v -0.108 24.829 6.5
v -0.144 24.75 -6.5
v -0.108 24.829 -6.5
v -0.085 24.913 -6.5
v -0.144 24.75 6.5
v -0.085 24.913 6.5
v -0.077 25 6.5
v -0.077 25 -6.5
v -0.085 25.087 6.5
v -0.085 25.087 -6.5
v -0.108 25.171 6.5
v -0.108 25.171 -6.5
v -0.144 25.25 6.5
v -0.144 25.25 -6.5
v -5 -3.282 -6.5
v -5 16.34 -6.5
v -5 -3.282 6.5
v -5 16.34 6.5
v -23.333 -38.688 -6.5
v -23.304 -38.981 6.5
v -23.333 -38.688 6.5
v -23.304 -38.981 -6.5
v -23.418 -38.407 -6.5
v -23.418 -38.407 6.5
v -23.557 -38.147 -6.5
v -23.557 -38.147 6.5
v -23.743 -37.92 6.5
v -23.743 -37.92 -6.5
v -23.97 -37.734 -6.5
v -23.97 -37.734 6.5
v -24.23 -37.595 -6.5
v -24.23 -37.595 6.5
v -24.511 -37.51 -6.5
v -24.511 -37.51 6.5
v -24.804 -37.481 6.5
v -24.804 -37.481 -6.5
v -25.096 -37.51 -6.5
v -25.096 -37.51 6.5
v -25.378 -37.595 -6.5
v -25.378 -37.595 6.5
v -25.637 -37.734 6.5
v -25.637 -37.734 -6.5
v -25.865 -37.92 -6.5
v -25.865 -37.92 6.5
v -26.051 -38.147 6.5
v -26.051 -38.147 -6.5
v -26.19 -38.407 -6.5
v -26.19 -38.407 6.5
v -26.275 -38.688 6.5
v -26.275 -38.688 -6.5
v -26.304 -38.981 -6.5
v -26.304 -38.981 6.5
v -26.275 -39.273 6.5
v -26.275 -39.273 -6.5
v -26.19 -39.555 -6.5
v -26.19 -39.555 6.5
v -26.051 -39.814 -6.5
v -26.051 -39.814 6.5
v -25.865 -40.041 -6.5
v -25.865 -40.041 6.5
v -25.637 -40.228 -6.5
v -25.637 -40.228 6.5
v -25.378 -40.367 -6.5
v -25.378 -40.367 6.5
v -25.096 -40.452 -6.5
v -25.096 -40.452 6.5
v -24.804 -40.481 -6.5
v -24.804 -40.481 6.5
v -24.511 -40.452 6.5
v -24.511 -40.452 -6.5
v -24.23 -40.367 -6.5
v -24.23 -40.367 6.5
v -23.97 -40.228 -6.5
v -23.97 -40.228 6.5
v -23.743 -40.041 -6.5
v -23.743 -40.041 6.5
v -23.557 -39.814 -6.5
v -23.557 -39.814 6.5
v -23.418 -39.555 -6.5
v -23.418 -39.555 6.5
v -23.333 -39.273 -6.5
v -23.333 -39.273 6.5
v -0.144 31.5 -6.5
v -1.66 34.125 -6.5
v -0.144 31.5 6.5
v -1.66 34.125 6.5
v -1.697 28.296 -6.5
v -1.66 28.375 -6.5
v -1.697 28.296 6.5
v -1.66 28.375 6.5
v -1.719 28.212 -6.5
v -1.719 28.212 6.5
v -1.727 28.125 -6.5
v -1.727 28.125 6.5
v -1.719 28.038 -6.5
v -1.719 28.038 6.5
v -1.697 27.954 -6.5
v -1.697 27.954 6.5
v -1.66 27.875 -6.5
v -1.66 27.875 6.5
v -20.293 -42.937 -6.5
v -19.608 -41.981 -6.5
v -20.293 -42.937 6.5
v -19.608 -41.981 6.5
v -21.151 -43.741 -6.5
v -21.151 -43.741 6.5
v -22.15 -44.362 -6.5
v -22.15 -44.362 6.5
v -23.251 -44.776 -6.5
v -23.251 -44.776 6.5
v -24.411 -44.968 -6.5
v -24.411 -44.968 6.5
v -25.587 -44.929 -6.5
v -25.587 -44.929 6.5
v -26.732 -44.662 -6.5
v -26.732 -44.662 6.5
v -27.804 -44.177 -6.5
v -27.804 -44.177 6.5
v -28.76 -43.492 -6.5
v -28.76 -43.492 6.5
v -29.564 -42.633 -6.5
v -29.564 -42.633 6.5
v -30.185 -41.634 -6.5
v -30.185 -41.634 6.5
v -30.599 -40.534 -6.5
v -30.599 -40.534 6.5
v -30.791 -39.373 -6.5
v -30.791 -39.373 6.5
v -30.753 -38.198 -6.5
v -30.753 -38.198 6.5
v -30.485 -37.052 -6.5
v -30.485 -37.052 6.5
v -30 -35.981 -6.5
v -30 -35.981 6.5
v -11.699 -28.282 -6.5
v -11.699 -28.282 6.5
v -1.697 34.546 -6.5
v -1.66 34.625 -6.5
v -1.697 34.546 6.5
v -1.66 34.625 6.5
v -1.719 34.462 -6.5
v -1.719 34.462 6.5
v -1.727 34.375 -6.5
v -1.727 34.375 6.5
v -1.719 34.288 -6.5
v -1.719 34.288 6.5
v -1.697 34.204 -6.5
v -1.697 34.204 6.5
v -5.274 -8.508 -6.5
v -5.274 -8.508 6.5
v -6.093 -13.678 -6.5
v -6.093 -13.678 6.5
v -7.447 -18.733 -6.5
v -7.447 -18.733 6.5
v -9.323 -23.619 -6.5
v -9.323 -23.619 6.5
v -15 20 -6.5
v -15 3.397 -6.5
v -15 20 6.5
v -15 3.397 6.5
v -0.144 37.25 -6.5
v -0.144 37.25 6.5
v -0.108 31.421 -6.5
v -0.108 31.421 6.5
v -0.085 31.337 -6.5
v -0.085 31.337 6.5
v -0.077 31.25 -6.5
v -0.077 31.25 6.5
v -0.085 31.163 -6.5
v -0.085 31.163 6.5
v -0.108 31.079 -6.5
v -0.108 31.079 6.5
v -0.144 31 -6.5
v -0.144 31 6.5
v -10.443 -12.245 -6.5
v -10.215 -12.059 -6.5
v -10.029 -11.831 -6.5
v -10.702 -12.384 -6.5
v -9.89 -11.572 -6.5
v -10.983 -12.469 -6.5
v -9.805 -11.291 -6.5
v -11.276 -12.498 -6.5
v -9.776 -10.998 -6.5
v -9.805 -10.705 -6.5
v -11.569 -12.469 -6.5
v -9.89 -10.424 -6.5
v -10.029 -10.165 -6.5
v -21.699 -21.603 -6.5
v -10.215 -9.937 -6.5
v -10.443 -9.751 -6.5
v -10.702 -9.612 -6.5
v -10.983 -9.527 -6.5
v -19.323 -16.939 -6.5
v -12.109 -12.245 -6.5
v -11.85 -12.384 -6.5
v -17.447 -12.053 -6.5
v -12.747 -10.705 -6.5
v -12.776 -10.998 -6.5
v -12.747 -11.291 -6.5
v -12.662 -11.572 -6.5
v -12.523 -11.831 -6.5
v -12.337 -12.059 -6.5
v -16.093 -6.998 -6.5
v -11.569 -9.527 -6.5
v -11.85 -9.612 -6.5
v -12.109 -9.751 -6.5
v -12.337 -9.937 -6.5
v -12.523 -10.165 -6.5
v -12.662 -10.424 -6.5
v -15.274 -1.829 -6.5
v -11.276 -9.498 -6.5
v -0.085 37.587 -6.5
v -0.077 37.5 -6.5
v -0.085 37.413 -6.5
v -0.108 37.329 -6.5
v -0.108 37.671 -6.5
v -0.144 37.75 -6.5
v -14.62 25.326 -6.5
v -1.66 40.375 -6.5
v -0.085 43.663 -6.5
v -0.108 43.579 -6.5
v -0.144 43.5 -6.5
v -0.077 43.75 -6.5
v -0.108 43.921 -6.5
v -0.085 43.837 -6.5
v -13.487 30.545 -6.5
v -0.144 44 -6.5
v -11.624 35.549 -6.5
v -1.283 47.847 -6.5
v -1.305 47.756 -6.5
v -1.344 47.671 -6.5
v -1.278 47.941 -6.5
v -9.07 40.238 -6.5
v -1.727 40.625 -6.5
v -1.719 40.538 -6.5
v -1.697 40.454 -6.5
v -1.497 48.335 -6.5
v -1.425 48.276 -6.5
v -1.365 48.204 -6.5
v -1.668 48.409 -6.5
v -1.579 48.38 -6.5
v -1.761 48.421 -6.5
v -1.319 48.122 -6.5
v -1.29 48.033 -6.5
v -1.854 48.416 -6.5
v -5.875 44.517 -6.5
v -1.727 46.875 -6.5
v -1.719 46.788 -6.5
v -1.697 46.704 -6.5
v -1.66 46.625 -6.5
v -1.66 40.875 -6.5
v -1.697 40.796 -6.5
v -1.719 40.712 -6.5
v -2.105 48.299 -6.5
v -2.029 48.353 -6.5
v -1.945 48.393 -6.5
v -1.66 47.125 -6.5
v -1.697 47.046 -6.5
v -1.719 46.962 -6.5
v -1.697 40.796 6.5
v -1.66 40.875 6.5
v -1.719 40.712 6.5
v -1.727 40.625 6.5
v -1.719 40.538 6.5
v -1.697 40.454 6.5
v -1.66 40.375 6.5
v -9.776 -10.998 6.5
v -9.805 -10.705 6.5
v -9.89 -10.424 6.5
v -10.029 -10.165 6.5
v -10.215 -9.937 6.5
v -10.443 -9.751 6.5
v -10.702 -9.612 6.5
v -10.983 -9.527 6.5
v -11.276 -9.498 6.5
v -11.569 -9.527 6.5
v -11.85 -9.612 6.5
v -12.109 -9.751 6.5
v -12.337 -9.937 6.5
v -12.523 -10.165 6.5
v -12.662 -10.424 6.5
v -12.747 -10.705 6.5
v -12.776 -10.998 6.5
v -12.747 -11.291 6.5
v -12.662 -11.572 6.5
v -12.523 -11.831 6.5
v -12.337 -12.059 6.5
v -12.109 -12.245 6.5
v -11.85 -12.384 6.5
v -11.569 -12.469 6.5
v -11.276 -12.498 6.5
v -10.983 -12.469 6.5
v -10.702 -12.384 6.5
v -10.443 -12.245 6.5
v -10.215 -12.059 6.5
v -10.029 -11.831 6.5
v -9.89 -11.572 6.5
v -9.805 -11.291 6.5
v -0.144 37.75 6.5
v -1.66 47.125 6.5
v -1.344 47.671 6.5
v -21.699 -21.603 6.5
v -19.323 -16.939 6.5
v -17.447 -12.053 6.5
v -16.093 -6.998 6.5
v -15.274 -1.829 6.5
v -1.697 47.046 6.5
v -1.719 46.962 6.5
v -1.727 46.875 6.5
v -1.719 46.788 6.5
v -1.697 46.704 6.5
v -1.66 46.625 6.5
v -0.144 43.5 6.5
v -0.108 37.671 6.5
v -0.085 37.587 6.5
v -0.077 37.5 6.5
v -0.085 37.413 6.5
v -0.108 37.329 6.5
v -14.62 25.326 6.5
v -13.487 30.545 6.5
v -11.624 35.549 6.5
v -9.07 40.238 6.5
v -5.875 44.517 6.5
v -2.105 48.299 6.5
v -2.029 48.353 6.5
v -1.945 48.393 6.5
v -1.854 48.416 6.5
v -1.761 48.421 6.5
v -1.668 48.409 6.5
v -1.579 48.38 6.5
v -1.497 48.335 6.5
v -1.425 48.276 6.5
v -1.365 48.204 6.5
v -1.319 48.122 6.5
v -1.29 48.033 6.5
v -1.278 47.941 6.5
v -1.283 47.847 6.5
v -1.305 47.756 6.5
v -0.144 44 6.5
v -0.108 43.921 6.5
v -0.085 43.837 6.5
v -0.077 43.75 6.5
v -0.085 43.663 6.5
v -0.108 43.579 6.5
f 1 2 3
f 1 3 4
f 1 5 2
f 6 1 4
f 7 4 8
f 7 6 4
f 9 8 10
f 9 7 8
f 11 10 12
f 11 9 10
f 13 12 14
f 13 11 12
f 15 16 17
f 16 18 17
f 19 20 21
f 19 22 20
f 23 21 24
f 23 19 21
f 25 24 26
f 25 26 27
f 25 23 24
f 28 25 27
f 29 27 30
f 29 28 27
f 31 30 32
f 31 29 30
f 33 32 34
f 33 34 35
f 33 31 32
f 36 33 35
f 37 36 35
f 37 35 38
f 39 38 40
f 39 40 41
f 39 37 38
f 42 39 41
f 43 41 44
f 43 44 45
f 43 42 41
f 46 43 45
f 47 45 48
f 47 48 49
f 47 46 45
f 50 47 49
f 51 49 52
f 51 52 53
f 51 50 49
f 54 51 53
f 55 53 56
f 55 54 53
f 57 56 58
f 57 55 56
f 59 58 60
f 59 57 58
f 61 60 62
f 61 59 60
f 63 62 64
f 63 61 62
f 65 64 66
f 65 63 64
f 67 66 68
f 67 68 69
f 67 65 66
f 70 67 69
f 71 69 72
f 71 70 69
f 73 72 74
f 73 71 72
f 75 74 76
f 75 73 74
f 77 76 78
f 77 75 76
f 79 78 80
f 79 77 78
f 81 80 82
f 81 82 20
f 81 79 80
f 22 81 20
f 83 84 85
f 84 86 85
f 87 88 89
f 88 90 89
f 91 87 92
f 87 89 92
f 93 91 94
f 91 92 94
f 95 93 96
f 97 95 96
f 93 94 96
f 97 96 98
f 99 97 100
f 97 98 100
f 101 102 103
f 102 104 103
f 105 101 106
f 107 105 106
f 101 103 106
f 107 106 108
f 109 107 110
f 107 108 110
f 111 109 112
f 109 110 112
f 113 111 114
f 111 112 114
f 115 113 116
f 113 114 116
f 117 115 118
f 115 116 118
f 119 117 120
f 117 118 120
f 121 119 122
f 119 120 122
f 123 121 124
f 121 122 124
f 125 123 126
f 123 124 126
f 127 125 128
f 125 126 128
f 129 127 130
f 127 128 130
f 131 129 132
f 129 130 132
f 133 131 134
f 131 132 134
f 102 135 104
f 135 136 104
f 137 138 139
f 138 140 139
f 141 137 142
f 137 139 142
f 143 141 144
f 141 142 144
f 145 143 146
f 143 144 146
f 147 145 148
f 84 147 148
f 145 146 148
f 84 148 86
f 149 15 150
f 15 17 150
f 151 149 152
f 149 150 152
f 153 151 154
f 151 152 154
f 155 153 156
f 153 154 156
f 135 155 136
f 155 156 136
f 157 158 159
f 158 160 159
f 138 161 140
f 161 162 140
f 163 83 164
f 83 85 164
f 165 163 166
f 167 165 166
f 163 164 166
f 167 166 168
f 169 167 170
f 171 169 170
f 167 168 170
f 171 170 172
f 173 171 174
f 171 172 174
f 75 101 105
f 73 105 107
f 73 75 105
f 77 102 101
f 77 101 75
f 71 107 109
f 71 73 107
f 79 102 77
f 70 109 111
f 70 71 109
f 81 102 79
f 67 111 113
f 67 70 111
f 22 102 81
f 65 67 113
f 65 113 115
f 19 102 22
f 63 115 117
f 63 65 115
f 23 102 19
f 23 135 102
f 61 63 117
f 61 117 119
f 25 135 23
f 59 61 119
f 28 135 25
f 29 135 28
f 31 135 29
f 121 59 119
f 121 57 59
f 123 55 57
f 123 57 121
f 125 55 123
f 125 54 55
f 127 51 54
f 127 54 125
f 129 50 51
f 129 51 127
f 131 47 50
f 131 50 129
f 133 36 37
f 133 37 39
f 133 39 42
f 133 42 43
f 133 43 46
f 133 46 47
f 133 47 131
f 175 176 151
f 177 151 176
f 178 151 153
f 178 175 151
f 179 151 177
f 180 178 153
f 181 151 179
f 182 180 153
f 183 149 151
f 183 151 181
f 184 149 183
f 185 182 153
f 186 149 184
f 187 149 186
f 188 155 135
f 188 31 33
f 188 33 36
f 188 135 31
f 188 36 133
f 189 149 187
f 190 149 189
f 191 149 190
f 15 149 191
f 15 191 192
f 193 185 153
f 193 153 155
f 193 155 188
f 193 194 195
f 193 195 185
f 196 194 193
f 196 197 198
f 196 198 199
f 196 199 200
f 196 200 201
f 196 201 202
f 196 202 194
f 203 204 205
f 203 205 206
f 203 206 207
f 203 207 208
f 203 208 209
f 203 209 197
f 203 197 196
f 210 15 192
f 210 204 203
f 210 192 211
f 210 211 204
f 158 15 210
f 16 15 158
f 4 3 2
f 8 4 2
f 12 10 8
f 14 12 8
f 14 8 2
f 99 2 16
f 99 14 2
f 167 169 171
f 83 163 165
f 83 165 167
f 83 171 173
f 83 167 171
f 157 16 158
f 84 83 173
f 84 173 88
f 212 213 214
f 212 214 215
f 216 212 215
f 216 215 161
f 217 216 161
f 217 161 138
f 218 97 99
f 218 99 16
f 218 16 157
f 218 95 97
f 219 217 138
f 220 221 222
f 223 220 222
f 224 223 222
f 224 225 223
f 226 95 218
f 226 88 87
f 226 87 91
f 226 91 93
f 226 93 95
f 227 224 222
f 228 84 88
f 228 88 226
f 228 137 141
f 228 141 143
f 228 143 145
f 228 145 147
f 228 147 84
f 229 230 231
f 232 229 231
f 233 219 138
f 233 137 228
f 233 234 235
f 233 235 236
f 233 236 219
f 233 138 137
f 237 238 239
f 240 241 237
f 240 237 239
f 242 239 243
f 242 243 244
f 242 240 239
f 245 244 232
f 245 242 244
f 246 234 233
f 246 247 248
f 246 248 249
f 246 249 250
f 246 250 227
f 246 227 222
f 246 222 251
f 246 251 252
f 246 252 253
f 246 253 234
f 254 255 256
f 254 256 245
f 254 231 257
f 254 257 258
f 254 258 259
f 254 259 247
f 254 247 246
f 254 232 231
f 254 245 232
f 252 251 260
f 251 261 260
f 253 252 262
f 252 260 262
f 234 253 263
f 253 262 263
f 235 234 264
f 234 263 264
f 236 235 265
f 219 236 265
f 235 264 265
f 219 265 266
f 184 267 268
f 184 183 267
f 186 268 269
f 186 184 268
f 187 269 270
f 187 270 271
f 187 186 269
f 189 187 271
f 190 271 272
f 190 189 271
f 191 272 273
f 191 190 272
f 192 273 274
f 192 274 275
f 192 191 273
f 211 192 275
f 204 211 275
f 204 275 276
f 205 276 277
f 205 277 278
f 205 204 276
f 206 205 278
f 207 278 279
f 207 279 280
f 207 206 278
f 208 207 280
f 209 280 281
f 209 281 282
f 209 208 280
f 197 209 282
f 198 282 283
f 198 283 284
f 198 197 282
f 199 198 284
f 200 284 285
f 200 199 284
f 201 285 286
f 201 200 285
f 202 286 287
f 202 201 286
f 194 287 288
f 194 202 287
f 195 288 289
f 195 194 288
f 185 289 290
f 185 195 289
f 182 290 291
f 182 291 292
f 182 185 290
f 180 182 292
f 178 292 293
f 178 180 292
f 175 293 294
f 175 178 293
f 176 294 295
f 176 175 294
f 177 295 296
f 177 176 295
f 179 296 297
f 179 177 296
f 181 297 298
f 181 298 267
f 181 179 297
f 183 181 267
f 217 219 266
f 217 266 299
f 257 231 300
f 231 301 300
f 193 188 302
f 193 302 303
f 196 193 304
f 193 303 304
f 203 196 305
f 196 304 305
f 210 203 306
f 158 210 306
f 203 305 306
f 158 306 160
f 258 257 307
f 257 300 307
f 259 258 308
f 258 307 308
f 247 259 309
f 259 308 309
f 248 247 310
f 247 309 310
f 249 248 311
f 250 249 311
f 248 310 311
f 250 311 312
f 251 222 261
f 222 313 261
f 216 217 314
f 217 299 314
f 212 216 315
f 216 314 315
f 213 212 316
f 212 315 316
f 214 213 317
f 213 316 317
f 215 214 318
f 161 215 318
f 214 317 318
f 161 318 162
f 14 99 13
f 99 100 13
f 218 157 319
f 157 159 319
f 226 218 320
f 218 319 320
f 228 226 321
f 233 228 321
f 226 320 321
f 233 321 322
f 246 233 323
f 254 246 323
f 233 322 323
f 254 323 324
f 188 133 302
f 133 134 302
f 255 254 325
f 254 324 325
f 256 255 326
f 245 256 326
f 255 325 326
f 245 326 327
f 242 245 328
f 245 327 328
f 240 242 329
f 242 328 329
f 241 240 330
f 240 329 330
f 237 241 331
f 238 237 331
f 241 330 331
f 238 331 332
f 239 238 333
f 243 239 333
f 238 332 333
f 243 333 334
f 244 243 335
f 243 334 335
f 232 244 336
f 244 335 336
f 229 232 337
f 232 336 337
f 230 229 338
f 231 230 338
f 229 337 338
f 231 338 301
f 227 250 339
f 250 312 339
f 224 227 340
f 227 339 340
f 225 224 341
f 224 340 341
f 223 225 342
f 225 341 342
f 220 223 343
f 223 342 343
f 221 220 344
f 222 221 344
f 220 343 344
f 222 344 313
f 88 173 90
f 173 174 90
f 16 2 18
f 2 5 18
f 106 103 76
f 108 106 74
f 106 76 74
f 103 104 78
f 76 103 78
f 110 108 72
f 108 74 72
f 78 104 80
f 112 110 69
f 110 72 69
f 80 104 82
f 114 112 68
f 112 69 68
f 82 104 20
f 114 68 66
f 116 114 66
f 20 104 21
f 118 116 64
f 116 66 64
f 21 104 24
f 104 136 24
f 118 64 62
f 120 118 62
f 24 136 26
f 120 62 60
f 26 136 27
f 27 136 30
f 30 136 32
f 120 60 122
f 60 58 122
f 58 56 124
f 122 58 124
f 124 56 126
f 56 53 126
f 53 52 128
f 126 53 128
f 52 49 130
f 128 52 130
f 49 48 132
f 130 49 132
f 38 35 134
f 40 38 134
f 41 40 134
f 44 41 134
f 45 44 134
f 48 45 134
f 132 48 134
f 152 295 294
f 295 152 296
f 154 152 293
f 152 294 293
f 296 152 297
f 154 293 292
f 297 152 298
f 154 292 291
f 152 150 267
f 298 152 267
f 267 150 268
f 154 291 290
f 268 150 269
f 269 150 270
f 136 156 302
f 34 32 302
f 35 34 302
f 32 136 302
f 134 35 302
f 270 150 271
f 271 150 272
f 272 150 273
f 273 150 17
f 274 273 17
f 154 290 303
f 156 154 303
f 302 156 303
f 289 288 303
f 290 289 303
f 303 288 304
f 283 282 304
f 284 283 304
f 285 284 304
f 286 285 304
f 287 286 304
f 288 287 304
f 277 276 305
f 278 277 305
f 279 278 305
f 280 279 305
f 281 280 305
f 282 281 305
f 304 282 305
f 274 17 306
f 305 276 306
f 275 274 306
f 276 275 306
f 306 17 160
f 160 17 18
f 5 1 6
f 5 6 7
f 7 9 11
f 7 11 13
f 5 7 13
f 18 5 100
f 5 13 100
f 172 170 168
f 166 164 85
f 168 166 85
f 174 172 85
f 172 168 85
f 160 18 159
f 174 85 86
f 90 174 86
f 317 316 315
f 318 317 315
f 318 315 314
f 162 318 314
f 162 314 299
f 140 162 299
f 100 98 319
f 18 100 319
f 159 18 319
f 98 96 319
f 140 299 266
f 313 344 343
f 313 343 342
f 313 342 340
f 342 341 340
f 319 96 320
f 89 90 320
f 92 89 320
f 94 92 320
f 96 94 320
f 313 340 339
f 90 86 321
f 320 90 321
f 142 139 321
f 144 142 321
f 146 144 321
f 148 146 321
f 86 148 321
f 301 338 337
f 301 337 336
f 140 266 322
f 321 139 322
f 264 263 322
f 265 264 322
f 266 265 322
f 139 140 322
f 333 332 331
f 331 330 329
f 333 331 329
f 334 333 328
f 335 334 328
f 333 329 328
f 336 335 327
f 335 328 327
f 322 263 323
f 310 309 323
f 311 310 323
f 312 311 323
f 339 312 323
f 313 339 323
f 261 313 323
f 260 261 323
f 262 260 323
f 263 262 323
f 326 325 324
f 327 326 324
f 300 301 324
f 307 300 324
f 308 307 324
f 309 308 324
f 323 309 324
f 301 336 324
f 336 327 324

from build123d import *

# Parameters (mm, degrees)
SKETCH1_R           = 1.5
BOSS_EXTRUDE1_DEPTH = 6.5
FILLET1_R           = 0.5


with BuildPart() as part:
    # Sketch1 → Boss-Extrude1 (new body, symmetric)
    with BuildSketch(Plane.XY):
        with BuildLine():
            Line((0, 25), (-5, 16.339745962))
            Line((-5, 16.339745962), (-5, -3.282032303))
            ThreePointArc((-5, -3.282032303), (-6.703708686, -16.222984558), (-11.698729811, -28.282032303))
            Line((-11.698729811, -28.282032303), (-19.607695155, -41.980762114))
            ThreePointArc((-19.607695155, -41.980762114), (-27.803847577, -44.176914536), (-30, -35.980762114))
            Line((-30, -35.980762114), (-21.698729811, -21.602540378))
            ThreePointArc((-21.698729811, -21.602540378), (-16.703708686, -9.543492634), (-15, 3.397459622))
            Line((-15, 3.397459622), (-15, 20))
            ThreePointArc((-15, 20), (-11.041019662, 36.770509831), (0, 50))
            Line((0, 50), (-1.804219591, 46.875))
            Line((-1.804219591, 46.875), (0, 43.75))
            Line((0, 43.75), (-1.804219591, 40.625))
            Line((-1.804219591, 40.625), (0, 37.5))
            Line((0, 37.5), (-1.804219591, 34.375))
            Line((-1.804219591, 34.375), (0, 31.25))
            Line((0, 31.25), (-1.804219591, 28.125))
            Line((-1.804219591, 28.125), (0, 25))
        make_face()
        with Locations((-24.803847577, -38.980762114)):
            Circle(SKETCH1_R, mode=Mode.SUBTRACT)
        with Locations((-11.275914322, -10.99786575)):
            Circle(SKETCH1_R, mode=Mode.SUBTRACT)
    extrude(amount=BOSS_EXTRUDE1_DEPTH, both=True)

    # Fillet1
    fillet1_edges = [part.edges().sort_by_distance(p)[0] for p in [
        (0, 50, 0),
        (-1.804219591, 46.875, 0),
        (0, 43.75, 0),
        (-1.804219591, 40.625, 0),
        (0, 37.5, 0),
        (-1.804219591, 34.375, 0),
        (0, 31.25, 0),
        (-1.804219591, 28.125, 0),
        (0, 25, 0),
    ]]
    fillet(fillet1_edges, radius=FILLET1_R)


solid = part.part
